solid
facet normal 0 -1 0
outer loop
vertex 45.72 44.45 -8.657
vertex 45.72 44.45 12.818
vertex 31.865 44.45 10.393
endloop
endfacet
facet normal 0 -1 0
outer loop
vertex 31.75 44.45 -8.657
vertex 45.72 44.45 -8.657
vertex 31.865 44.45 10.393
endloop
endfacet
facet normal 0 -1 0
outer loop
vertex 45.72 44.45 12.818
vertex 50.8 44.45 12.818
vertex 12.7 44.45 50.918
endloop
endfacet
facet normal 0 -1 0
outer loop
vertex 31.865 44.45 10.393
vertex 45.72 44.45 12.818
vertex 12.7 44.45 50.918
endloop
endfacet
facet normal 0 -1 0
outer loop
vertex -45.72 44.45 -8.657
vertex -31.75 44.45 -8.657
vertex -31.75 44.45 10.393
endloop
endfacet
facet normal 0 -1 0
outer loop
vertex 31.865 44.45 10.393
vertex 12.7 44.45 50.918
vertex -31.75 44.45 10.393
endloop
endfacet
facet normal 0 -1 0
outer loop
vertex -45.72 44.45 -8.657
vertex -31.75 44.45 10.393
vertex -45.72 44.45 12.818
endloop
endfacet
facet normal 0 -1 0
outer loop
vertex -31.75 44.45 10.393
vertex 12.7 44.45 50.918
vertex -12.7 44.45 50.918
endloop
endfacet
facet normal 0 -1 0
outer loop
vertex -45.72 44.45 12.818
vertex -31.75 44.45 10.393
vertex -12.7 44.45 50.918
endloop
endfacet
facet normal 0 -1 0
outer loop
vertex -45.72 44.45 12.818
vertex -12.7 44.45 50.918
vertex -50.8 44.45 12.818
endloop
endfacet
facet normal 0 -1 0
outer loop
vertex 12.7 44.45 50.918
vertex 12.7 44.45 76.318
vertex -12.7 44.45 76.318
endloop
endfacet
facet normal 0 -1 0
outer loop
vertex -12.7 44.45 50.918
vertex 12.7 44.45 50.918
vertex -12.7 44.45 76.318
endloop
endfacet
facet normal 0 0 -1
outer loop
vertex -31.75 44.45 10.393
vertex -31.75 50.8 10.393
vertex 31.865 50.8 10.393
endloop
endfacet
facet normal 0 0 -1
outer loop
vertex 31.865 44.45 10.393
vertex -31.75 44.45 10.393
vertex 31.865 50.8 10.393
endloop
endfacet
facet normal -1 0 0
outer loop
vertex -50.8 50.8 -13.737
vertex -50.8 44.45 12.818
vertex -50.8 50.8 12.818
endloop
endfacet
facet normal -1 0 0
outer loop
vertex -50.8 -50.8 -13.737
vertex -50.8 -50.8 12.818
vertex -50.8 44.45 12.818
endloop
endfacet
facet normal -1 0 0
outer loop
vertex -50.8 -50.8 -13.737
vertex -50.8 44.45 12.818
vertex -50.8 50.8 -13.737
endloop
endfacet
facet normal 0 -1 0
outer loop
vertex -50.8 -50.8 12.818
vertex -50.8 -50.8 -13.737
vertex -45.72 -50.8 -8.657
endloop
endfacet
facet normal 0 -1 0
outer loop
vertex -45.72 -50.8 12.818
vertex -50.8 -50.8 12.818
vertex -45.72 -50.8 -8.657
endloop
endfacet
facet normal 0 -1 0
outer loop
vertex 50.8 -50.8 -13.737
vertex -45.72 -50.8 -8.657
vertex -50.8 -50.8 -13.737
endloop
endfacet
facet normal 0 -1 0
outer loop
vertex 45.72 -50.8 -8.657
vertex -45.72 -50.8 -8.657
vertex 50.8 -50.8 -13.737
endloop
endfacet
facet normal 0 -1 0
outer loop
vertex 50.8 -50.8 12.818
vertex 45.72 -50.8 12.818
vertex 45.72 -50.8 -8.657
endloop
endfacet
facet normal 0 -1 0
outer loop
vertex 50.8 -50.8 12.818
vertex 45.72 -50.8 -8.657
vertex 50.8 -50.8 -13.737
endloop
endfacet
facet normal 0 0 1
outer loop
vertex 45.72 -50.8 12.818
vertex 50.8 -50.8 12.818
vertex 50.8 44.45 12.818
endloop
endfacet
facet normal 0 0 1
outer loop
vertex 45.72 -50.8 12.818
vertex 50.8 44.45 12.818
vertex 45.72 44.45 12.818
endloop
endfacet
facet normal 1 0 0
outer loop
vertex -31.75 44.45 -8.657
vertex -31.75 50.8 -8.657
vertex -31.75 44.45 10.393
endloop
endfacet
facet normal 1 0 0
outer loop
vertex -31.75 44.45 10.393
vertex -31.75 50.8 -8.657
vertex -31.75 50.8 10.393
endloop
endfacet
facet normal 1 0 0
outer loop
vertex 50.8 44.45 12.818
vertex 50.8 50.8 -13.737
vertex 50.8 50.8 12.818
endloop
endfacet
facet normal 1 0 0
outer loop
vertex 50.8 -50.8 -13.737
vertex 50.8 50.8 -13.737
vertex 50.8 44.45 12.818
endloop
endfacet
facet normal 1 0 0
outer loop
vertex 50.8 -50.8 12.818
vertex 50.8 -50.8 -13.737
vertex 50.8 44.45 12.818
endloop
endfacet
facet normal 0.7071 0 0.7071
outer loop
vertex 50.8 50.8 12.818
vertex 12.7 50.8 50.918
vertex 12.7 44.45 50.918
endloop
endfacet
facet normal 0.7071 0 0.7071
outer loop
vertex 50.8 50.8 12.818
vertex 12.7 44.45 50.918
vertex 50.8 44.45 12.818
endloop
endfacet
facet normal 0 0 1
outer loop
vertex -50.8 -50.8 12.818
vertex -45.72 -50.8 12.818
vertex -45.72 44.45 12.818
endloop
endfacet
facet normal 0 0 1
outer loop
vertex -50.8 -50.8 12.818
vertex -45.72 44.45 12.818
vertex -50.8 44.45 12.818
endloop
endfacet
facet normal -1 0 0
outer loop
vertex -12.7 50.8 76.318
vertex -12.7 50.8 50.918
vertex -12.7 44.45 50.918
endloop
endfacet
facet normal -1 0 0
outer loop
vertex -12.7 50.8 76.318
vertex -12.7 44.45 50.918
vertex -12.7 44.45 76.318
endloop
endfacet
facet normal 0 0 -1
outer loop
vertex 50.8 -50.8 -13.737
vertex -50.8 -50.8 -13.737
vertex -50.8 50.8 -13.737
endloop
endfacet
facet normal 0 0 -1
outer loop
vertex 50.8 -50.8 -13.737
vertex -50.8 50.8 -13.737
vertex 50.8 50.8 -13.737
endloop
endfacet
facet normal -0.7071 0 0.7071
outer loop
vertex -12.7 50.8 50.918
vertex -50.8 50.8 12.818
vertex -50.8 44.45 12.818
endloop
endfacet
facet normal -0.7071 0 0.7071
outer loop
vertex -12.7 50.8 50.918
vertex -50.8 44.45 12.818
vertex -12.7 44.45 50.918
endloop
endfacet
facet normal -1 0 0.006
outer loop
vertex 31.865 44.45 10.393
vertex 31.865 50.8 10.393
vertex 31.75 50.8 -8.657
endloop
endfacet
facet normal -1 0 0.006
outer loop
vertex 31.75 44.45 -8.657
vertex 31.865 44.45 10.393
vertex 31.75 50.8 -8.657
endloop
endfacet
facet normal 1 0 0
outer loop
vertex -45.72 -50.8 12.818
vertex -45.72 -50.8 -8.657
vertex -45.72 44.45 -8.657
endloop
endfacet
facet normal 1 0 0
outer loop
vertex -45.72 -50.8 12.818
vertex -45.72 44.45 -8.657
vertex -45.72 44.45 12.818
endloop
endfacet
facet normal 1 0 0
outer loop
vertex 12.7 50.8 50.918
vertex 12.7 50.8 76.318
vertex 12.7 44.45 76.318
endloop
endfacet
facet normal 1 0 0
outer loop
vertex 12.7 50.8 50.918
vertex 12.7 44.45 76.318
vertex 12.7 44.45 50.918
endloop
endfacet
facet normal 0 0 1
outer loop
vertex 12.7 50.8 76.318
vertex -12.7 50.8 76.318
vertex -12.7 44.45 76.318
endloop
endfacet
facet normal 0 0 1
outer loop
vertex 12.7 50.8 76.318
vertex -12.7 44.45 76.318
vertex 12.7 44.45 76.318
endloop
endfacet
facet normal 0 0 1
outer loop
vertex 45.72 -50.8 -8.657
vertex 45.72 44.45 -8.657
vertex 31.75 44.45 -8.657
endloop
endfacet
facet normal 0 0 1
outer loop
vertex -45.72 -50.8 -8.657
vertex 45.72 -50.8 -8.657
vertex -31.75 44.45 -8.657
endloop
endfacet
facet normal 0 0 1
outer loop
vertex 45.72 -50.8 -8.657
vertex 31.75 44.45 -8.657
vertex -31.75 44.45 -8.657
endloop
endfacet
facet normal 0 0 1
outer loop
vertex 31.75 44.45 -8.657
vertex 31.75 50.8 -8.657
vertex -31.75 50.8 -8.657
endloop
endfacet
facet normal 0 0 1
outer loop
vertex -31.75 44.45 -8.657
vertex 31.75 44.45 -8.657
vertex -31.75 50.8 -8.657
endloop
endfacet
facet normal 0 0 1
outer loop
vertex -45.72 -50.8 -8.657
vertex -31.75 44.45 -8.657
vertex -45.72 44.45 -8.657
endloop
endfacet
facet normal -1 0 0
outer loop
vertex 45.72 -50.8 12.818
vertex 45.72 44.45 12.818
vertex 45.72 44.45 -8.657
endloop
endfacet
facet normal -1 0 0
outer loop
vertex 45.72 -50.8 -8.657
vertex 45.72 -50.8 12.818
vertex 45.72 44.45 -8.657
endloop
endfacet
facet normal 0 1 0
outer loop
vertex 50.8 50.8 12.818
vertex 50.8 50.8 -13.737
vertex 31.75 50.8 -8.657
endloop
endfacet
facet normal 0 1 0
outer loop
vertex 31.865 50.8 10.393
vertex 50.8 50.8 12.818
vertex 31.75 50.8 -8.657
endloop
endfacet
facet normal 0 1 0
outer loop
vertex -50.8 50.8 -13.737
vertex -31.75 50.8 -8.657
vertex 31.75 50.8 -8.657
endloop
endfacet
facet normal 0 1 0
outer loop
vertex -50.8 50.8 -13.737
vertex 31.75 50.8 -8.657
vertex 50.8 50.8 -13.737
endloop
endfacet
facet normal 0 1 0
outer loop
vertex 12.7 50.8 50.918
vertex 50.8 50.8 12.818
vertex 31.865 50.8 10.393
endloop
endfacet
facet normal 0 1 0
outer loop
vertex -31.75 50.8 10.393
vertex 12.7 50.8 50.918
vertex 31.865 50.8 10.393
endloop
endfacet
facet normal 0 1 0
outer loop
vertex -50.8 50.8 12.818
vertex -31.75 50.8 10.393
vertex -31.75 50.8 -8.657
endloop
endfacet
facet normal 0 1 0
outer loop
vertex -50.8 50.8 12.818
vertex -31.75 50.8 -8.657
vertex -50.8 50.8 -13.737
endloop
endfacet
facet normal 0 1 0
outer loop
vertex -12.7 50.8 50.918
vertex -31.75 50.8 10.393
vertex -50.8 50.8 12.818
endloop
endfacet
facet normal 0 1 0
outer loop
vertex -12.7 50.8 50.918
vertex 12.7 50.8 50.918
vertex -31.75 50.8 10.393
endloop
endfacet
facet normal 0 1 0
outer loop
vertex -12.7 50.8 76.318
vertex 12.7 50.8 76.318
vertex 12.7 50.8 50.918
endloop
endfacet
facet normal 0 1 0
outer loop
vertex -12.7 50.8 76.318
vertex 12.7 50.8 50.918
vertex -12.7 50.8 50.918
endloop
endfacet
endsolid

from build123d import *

# Parameters (mm, degrees)
F1_DEPTH = 50.8
F3_DEPTH = 6.35
F5_DEPTH = 6.35


with BuildPart() as f1:
    # F0 (on Front) → F1 (new body, symmetric)
    with BuildSketch(Plane.XZ):
        Polygon((-50.8, 12.817732), (-50.8, -13.73706), (50.8, -13.73706), (50.8, 12.817732), (45.72, 12.817732), (45.72, -8.65706), (-45.72, -8.65706), (-45.72, 12.817732), align=None)
    extrude(amount=F1_DEPTH, both=True)

    # F2 (on face) → F3 (join)
    with BuildSketch(Plane(origin=(0, 50.8, 0), x_dir=(-1, 0, 0), z_dir=(0, 1, 0))):
        Polygon((45.72, 12.817732), (50.8, 12.817732), (12.7, 50.917732), (12.7, 76.317732), (-12.7, 76.317732), (-12.7, 50.917732), (-50.8, 12.817732), (-45.72, 12.817732), (-45.72, -8.65706), (45.72, -8.65706), align=None)
    extrude(amount=-F3_DEPTH)

    # F4 (on face) → F5 (cut, through all)
    with BuildSketch(Plane(origin=(0, 50.8, 0), x_dir=(-1, 0, 0), z_dir=(0, 1, 0))):
        Polygon((-31.75, -8.65706), (31.75, -8.65706), (31.75, 10.392591), (-31.865364, 10.392591), align=None)
    extrude(amount=-F5_DEPTH, mode=Mode.SUBTRACT)


solid = f1.part
